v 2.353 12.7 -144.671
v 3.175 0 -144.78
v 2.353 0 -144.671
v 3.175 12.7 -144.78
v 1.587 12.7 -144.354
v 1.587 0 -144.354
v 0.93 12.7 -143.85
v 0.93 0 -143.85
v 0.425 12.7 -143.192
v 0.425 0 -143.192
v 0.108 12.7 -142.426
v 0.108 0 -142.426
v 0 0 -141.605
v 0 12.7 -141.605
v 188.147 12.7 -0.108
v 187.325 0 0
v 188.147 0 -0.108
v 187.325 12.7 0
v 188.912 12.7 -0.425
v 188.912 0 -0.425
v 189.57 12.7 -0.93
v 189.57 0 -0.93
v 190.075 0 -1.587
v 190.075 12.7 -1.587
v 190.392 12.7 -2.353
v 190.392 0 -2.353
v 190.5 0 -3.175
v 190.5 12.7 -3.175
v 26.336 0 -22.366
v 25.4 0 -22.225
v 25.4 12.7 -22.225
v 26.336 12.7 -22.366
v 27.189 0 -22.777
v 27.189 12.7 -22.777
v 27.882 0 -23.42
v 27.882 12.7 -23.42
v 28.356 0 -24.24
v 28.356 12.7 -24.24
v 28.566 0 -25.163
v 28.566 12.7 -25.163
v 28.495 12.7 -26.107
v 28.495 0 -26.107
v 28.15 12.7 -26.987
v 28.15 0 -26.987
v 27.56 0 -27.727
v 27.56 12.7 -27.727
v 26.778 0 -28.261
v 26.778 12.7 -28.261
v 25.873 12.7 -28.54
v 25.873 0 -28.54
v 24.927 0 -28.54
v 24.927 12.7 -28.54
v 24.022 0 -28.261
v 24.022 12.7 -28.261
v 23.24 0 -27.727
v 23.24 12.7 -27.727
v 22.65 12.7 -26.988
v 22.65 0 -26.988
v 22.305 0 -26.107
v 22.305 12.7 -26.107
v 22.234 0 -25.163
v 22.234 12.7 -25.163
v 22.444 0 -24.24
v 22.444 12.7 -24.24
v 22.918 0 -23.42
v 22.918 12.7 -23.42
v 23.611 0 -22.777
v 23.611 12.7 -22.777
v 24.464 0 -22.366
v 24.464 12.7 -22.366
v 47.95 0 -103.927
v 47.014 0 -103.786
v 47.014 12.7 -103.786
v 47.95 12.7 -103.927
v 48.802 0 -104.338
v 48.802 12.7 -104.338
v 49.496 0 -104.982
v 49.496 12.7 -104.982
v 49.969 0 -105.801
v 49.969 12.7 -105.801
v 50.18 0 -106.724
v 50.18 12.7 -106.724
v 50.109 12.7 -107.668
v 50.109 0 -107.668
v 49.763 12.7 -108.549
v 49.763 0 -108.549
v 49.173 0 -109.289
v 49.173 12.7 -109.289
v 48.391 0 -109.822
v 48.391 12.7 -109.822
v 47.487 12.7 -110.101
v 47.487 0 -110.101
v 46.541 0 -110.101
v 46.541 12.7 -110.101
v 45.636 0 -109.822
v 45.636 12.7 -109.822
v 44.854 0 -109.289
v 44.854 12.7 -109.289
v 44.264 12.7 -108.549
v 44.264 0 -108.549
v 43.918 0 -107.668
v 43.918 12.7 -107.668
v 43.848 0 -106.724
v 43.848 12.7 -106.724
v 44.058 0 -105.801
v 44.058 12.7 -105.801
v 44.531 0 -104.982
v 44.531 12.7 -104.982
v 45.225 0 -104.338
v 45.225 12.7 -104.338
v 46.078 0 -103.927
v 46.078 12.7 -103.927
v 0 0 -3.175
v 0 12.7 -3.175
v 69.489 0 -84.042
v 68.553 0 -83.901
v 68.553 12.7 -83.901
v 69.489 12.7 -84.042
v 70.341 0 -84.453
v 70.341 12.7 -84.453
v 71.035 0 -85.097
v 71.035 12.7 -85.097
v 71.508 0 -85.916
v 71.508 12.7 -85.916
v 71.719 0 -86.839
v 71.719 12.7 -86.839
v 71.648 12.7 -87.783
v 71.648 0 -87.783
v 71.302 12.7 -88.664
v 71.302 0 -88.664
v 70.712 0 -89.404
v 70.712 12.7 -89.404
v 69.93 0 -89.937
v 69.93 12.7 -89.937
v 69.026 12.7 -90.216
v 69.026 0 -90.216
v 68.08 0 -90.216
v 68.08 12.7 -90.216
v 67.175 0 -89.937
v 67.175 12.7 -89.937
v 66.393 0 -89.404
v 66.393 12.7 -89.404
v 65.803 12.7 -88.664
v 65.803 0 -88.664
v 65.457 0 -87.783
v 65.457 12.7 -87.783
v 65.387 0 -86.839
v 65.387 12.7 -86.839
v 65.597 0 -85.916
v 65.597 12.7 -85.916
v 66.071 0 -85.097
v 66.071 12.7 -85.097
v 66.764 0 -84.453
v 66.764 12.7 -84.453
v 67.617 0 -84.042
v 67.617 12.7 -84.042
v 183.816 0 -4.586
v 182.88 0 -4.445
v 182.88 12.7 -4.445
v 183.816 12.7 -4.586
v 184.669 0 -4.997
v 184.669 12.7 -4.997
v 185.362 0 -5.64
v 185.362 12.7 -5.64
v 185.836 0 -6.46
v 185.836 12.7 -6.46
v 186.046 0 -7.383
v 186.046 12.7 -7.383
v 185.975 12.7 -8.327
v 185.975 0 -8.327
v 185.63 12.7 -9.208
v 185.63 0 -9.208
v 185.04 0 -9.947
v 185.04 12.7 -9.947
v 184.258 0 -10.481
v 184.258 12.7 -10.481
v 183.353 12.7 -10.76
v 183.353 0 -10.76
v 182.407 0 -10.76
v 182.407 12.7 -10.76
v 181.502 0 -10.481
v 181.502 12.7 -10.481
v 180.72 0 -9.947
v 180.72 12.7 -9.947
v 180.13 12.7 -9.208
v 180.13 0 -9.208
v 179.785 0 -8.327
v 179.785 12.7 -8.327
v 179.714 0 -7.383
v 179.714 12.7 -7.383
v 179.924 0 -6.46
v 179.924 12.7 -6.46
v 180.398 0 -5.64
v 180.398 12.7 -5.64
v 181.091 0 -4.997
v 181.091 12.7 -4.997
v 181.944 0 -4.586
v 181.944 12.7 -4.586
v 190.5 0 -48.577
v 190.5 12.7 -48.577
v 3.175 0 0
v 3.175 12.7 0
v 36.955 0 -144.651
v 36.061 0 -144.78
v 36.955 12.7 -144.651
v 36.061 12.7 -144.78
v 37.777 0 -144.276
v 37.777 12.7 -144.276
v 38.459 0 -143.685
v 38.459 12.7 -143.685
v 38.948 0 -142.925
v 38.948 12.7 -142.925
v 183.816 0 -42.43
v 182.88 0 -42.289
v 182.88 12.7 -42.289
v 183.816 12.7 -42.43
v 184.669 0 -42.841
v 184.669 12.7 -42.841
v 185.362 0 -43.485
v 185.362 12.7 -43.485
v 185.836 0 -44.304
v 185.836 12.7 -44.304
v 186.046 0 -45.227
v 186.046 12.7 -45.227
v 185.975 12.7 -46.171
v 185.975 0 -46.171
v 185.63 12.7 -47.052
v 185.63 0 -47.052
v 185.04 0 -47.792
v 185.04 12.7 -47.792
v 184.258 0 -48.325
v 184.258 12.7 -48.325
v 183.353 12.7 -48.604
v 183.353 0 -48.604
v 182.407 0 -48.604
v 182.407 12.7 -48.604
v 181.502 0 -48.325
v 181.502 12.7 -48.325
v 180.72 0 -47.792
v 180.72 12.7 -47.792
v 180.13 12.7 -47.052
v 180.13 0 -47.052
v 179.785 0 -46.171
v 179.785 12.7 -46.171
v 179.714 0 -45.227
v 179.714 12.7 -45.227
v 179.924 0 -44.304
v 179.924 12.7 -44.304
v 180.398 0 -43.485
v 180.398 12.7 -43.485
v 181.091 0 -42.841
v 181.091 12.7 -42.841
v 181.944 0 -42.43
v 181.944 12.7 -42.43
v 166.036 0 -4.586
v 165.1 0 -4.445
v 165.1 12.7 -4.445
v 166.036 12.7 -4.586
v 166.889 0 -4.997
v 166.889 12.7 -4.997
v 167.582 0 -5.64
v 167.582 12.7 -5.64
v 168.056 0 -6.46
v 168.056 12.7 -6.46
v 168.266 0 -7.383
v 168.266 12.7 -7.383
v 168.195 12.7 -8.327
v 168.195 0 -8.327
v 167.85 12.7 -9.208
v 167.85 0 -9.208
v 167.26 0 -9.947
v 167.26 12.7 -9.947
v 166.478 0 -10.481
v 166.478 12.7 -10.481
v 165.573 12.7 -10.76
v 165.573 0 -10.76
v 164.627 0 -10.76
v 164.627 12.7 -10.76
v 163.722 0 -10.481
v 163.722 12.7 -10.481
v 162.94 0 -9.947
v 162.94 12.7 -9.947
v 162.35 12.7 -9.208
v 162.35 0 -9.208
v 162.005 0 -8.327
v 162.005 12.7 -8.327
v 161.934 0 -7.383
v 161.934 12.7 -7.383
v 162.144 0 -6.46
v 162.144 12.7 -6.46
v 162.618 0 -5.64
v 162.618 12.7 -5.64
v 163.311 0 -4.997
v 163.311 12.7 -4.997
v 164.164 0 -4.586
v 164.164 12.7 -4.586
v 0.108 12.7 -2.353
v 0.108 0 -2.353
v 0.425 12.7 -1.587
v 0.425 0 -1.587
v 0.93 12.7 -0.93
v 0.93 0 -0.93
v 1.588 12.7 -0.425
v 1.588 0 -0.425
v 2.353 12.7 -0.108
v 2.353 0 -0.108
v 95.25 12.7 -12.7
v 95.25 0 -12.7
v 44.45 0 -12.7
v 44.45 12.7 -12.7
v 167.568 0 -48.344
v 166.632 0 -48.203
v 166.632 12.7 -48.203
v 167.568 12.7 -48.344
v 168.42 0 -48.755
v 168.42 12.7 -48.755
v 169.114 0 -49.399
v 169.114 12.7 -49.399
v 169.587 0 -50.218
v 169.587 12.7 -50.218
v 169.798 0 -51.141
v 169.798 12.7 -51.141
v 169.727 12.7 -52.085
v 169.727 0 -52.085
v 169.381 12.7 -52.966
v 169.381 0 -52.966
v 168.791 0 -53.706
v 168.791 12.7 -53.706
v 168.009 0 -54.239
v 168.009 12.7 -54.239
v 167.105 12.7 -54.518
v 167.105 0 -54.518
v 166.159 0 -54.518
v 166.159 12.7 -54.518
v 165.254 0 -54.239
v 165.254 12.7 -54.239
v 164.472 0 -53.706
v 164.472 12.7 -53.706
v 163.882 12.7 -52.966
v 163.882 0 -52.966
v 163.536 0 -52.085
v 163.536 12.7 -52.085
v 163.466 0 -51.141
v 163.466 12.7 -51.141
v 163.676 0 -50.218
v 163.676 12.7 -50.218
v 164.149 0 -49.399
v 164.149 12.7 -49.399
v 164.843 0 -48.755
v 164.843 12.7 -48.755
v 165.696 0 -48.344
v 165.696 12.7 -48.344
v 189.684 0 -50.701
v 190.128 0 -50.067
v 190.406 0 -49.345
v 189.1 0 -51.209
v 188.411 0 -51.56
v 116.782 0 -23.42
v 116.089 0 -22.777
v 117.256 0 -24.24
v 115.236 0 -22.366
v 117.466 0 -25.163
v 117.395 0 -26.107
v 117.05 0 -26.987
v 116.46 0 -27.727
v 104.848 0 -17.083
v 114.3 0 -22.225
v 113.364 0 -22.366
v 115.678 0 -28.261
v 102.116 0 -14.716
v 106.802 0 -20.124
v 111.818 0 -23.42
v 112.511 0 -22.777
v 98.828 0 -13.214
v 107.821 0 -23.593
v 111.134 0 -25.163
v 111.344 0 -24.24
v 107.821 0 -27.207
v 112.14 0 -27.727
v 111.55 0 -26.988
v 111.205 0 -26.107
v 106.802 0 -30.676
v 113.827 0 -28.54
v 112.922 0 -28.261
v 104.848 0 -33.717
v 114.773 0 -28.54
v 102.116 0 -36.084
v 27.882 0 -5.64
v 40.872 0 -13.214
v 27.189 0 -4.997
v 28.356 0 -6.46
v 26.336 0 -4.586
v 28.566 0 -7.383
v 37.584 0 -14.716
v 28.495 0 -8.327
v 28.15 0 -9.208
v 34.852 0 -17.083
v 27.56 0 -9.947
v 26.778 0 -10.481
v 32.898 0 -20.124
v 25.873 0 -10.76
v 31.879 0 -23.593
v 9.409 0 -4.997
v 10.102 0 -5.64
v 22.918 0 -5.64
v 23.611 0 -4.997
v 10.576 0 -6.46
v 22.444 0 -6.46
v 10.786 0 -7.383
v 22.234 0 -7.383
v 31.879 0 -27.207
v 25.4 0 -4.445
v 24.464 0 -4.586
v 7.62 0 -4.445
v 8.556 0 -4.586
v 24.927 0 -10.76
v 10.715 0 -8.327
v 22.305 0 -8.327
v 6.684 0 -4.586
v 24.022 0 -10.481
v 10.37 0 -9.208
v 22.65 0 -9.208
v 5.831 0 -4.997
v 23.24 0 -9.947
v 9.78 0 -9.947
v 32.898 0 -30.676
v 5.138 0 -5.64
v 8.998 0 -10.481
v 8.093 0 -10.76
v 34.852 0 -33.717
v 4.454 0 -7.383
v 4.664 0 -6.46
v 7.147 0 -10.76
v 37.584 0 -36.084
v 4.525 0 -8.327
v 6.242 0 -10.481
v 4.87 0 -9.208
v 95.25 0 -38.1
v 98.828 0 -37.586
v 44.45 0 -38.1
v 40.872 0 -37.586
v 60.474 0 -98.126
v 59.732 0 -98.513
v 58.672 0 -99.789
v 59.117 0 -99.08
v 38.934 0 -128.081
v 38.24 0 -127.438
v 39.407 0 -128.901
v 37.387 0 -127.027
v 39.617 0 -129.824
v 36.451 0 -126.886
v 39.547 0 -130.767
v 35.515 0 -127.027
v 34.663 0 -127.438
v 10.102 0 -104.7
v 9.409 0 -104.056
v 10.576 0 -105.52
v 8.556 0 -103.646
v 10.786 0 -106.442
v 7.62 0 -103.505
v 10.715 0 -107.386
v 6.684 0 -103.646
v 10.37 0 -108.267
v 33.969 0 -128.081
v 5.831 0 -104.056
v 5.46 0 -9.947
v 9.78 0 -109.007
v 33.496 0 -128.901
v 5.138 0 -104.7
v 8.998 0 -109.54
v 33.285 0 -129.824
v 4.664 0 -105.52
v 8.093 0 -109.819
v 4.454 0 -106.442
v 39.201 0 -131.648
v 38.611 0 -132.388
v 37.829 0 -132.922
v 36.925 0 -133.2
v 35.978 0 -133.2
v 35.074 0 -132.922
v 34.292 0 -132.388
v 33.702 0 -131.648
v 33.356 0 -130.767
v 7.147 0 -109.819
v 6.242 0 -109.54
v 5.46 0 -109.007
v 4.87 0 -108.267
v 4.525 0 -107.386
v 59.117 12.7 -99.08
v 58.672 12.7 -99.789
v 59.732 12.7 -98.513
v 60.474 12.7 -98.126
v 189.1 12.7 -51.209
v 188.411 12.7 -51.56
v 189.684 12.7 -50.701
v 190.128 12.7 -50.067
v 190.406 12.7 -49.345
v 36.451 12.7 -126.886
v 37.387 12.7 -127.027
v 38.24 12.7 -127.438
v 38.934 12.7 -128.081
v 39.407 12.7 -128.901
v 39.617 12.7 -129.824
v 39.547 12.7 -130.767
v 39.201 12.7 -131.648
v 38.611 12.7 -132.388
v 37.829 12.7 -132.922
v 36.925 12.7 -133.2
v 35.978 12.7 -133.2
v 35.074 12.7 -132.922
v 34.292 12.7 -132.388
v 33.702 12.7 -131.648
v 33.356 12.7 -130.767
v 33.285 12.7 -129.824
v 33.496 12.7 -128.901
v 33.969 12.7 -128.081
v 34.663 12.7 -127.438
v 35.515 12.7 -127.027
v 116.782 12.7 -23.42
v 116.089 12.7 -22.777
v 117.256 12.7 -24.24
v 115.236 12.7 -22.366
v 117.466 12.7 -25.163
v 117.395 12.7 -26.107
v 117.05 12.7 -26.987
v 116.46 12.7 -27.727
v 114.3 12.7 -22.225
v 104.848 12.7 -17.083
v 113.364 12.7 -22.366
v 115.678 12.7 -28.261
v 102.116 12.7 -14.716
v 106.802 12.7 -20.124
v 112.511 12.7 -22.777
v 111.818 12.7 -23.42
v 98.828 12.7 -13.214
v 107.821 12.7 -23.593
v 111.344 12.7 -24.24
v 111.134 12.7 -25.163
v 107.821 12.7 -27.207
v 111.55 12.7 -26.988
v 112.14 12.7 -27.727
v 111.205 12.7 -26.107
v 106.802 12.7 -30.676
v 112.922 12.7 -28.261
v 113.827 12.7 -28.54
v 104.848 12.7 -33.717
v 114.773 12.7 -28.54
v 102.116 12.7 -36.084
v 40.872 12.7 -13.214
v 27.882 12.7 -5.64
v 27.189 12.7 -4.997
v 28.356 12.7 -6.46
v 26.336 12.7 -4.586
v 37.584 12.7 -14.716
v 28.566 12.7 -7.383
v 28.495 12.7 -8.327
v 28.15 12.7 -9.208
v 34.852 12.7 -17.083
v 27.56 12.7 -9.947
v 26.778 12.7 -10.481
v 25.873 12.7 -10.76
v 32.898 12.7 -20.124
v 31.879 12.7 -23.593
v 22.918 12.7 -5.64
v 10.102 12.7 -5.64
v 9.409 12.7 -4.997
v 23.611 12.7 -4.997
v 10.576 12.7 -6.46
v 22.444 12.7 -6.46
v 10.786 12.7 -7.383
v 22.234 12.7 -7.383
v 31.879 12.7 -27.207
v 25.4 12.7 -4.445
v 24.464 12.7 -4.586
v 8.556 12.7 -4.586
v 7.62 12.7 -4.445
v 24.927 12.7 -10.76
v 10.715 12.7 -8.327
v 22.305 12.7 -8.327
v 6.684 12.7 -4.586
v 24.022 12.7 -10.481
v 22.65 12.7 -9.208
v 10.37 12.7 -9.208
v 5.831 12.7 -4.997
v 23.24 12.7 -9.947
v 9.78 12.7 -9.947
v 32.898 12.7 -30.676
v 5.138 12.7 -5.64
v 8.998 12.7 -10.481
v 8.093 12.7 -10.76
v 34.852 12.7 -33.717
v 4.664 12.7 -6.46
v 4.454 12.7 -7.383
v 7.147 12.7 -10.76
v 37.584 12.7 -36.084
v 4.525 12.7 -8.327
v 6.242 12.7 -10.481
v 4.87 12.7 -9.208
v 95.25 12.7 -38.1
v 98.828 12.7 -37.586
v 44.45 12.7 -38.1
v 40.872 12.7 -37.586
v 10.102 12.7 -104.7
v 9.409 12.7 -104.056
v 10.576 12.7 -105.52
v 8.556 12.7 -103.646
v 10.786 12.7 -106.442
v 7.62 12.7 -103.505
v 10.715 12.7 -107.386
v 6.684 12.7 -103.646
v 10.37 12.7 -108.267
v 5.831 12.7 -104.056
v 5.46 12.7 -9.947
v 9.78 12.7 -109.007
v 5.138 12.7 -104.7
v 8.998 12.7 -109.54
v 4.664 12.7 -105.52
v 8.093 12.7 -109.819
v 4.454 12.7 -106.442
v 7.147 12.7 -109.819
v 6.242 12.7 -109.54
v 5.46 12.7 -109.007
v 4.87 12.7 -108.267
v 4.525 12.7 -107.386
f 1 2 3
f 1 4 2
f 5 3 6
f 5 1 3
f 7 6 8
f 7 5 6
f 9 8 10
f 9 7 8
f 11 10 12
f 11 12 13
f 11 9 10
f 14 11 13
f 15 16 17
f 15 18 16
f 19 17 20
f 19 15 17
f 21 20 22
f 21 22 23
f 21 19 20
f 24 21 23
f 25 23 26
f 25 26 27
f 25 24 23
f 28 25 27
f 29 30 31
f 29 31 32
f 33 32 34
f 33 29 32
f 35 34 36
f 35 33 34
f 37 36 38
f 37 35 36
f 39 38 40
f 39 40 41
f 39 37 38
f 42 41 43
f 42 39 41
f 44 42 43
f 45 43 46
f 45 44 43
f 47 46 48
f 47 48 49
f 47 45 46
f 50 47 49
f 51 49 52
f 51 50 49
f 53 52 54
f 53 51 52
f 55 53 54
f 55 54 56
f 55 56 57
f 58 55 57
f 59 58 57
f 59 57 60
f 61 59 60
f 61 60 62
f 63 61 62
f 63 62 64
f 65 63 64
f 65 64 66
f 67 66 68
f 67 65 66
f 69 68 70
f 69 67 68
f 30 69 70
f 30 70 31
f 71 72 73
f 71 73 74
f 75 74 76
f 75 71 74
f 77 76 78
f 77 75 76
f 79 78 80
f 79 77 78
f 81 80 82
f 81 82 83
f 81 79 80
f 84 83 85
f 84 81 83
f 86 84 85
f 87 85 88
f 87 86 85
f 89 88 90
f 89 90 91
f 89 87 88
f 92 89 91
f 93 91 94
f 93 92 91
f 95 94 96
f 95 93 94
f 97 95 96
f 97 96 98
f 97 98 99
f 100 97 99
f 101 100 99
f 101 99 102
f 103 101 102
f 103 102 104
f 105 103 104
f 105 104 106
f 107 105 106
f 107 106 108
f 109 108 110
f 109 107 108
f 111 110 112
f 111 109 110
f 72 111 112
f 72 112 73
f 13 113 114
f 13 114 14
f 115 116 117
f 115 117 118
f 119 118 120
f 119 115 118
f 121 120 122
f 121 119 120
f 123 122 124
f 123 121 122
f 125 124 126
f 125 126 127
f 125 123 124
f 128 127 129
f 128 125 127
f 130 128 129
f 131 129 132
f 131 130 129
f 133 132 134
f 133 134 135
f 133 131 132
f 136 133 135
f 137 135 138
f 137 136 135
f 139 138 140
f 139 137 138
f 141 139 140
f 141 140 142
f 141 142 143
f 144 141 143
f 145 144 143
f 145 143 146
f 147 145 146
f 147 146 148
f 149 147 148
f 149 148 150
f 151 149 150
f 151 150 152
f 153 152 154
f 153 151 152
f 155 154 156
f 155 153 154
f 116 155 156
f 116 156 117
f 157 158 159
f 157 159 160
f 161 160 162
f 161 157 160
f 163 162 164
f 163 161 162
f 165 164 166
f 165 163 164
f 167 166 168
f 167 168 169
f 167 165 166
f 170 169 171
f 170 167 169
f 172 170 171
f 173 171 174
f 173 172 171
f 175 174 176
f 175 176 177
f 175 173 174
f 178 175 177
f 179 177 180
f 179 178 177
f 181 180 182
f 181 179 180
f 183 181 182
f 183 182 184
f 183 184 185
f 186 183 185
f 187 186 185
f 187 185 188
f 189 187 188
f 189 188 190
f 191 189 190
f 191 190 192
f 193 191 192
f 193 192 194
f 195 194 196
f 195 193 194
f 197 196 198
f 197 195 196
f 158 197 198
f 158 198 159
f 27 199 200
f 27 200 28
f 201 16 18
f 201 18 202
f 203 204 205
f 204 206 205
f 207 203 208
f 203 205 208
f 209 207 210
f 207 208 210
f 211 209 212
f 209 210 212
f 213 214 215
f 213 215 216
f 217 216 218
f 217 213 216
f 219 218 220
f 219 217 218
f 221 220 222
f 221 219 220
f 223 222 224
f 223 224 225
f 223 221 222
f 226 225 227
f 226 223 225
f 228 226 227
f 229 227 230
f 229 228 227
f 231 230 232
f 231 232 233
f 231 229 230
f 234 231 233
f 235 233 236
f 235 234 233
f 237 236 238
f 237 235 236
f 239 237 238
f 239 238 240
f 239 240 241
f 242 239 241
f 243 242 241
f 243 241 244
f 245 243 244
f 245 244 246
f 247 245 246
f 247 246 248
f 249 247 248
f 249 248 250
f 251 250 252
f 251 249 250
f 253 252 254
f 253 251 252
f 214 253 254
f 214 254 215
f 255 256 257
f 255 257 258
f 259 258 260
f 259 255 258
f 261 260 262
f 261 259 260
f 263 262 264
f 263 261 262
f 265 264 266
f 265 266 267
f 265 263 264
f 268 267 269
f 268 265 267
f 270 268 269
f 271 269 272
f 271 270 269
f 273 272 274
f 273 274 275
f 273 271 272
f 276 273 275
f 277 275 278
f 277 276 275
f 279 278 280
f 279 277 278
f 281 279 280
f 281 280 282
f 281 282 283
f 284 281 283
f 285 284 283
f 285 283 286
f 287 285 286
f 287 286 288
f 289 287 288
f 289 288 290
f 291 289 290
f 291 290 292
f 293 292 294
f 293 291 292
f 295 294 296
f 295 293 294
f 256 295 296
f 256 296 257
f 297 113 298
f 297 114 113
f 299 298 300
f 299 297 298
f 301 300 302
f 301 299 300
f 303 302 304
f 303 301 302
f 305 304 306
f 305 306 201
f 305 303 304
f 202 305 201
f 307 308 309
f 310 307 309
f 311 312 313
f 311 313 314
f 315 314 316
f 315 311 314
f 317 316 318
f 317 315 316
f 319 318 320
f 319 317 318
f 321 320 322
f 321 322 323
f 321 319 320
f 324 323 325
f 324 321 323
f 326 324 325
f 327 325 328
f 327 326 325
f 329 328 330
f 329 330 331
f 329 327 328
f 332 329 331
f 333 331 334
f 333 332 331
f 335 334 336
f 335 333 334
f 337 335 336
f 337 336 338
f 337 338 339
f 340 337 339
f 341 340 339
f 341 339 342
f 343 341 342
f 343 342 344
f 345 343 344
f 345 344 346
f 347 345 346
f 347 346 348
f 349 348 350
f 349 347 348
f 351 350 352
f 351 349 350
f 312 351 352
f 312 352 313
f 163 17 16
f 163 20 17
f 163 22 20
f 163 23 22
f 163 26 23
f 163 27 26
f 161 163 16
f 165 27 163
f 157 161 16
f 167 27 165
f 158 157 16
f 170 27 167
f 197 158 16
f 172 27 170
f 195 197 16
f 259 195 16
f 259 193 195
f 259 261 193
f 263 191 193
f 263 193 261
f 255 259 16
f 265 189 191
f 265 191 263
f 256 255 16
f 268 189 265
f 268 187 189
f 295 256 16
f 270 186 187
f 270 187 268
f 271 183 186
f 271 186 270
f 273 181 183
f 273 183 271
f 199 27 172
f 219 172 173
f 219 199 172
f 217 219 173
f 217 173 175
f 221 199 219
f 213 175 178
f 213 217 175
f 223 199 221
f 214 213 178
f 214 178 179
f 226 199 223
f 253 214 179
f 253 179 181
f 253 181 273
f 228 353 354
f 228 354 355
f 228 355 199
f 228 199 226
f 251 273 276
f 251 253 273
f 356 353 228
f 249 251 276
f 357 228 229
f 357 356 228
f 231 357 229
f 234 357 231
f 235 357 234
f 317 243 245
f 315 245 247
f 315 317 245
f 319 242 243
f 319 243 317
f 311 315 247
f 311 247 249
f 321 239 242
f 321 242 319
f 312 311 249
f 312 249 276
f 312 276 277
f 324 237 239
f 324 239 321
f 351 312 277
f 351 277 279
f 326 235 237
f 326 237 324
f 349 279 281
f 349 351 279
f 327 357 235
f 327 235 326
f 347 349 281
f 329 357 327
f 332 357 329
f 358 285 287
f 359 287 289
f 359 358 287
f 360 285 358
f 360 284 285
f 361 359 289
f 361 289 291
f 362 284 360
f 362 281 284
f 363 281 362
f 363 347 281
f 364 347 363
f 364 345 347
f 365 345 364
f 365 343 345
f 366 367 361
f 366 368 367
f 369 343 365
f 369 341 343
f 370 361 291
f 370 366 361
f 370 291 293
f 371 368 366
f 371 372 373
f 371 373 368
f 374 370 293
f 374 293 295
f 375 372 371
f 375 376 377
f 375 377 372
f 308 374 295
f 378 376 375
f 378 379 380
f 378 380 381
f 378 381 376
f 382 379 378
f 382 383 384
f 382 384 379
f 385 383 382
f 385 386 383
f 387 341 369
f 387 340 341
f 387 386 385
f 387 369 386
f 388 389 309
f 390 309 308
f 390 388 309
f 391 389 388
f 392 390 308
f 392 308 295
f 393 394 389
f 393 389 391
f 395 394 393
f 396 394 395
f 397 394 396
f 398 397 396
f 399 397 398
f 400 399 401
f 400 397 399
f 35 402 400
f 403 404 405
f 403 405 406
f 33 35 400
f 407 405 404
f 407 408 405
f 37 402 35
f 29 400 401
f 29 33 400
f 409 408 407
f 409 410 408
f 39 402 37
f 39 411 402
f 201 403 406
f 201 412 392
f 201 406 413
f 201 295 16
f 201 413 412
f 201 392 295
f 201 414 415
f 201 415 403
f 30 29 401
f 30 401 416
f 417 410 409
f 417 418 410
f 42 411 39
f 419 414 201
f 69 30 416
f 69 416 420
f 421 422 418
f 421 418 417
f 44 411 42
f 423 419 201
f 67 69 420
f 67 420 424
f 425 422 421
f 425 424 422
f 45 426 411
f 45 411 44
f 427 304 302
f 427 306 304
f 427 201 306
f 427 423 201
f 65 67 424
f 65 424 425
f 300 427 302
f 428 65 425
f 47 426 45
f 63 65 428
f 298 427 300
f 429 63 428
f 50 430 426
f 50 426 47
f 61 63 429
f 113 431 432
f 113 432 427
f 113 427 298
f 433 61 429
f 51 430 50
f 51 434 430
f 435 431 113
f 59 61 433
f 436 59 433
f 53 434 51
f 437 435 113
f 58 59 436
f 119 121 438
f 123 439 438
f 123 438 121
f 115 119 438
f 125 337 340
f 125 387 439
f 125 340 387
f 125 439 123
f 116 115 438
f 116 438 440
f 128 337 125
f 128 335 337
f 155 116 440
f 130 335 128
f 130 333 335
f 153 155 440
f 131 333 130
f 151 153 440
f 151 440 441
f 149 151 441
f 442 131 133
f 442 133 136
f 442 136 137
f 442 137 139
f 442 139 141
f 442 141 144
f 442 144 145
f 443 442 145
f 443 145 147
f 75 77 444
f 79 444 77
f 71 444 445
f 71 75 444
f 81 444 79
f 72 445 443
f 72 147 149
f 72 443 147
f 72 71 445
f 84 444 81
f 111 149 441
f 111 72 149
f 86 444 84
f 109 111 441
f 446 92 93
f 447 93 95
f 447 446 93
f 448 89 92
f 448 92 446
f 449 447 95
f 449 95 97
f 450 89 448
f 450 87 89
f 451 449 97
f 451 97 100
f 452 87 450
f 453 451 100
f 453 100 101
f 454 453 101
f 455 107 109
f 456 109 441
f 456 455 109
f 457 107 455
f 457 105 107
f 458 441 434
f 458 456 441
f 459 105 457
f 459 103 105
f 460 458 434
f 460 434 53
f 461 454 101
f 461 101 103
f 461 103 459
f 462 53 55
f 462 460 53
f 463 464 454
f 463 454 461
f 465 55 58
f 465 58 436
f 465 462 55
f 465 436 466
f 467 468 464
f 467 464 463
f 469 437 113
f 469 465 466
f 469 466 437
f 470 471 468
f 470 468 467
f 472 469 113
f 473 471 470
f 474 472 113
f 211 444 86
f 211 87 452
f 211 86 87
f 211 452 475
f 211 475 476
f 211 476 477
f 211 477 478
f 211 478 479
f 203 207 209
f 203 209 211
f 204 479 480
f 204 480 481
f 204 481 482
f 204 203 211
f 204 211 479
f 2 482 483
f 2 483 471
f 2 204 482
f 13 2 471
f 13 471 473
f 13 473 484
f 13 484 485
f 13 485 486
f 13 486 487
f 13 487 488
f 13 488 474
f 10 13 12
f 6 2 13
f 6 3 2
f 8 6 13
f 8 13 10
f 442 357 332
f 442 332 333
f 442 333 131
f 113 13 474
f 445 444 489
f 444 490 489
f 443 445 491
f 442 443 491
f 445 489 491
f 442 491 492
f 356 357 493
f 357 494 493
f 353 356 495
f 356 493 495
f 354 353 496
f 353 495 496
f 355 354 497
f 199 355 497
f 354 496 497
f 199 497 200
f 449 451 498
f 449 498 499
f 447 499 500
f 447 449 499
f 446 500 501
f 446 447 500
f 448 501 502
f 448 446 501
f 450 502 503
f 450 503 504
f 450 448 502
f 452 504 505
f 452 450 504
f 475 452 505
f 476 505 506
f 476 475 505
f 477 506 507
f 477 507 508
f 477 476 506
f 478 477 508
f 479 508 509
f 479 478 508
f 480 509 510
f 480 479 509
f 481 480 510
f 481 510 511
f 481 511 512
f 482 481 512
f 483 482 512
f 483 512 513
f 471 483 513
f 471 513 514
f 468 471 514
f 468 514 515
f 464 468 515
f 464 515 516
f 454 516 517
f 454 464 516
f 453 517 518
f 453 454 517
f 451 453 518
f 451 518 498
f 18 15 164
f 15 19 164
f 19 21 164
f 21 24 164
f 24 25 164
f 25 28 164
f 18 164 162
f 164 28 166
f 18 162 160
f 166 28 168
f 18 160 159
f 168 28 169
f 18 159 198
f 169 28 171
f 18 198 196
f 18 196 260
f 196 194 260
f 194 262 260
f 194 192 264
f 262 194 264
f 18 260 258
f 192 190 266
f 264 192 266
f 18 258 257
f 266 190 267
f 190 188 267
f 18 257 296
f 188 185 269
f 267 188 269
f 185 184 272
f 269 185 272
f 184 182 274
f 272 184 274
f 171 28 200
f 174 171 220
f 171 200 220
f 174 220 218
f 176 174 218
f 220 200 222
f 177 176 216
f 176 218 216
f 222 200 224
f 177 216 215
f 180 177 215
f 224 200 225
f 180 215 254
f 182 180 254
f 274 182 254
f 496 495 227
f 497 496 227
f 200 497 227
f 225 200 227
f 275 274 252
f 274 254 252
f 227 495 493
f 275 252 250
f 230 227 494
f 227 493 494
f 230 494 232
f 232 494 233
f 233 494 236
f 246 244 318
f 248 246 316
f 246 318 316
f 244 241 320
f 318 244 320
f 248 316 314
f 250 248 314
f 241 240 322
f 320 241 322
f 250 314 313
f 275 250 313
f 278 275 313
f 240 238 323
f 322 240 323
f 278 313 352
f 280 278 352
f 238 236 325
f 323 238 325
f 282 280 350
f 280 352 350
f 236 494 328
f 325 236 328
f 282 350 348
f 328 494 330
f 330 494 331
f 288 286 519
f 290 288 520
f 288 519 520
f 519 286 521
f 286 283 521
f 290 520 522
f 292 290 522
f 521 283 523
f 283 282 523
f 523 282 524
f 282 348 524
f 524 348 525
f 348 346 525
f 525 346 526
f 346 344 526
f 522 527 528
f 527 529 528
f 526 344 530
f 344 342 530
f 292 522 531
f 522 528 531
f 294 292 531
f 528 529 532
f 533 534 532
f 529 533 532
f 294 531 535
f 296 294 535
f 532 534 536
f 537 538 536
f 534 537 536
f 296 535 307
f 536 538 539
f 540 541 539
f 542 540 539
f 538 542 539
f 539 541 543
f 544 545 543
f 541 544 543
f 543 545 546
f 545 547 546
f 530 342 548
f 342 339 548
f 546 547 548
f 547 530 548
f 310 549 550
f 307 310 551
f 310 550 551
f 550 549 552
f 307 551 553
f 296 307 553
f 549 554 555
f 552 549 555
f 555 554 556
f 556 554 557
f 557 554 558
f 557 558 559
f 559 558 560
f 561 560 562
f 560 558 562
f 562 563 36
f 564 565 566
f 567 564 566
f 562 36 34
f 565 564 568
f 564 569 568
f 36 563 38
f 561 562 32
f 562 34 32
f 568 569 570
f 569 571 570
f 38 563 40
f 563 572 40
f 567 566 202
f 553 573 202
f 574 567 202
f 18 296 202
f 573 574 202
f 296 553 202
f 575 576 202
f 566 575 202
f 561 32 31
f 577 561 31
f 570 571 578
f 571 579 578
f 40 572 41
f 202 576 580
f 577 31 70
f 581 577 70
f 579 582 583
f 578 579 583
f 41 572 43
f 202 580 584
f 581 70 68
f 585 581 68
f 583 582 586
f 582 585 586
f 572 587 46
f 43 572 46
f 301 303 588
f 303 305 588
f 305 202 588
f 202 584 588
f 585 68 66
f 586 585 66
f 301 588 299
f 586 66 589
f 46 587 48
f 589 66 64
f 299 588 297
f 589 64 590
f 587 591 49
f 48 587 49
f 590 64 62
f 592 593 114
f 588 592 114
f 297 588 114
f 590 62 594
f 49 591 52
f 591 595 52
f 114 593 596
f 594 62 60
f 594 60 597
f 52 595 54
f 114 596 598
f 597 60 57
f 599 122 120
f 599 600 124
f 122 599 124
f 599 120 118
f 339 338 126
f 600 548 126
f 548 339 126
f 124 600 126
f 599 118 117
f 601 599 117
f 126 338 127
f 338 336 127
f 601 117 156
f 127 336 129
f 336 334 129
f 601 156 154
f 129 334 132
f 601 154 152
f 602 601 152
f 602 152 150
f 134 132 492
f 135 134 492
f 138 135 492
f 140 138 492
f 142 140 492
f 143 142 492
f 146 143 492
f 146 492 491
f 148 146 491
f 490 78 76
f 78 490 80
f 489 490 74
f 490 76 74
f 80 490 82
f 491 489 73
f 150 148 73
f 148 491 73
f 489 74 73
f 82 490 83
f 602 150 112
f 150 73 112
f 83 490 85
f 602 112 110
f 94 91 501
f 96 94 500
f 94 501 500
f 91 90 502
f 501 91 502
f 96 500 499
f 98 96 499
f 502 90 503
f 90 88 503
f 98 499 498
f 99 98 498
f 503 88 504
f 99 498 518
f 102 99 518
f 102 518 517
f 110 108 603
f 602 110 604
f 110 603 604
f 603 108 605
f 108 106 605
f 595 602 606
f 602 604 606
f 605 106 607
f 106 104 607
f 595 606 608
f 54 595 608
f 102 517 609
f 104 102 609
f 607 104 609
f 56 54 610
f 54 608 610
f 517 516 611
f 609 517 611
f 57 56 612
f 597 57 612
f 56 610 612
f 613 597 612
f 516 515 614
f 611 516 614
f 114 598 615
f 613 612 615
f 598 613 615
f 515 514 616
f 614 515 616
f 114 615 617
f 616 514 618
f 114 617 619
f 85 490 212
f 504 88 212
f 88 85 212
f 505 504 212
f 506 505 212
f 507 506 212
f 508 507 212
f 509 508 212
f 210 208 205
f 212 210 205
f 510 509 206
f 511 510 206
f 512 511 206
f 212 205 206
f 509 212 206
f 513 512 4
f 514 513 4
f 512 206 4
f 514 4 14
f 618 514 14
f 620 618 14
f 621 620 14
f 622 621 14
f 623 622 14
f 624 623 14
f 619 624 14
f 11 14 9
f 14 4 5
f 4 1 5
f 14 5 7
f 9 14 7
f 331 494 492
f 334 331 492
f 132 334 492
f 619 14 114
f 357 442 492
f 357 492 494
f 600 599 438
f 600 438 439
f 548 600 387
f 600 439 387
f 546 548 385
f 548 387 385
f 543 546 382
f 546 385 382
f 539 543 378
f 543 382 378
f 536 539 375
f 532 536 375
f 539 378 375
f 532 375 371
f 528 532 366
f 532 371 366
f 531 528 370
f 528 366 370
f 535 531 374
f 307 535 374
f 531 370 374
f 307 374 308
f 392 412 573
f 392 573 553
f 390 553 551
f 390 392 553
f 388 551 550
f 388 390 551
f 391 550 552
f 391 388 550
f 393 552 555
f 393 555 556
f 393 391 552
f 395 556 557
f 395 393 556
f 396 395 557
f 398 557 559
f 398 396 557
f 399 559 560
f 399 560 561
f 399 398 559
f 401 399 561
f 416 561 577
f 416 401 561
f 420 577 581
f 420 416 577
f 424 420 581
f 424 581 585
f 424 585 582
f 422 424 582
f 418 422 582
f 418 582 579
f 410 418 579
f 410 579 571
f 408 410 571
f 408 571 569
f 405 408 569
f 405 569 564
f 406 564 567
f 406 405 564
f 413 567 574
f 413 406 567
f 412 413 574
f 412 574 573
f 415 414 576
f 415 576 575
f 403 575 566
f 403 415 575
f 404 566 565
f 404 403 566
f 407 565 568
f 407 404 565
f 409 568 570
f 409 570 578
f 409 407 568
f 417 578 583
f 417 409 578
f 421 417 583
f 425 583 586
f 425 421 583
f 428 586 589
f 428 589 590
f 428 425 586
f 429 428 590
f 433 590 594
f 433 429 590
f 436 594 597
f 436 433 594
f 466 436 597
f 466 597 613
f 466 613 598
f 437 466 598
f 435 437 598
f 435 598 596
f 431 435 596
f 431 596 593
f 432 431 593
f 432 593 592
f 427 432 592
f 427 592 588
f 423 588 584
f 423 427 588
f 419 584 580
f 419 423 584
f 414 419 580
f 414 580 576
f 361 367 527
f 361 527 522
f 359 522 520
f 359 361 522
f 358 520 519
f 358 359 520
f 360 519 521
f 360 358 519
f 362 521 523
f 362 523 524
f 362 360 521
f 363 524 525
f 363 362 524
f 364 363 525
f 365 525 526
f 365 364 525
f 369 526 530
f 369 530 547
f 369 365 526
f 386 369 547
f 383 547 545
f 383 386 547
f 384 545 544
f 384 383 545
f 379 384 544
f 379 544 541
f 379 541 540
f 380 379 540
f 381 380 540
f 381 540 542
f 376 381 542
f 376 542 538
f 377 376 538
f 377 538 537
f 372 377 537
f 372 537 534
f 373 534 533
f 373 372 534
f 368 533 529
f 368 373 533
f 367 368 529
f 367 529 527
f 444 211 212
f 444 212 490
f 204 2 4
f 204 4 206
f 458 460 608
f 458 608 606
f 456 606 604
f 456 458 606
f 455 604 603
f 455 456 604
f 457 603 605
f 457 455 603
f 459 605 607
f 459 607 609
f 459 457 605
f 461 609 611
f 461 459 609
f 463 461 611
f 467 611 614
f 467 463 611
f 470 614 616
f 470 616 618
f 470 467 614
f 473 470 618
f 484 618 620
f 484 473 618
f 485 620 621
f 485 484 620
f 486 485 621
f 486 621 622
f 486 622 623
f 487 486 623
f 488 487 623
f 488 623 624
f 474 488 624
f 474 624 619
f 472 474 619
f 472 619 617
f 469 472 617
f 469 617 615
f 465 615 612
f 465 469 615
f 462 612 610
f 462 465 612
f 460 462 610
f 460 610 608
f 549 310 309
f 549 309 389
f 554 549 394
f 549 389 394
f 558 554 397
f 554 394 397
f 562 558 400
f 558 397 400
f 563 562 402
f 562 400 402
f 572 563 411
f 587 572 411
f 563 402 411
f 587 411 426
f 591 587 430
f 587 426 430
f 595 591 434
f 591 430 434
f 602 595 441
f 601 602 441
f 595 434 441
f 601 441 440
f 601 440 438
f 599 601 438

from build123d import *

# Parameters (mm, degrees)
BASE_R              = 3.175
BOSS_EXTRUDE1_DEPTH = 12.7
ROUTER_FILLET_R     = 3.175


with BuildPart() as part:
    # base → Boss-Extrude1 (new body)
    with BuildSketch(Plane(origin=(0, 0, 0), x_dir=(1, 0, 0), z_dir=(0, 1, 0))):
        Polygon((0, 144.779530825), (38.1, 144.779530825), (59.224940876, 98.580214023), (190.5, 50.8), (190.5, 0), (0, 0), align=None)
        with Locations(Location((166.631807432, 51.378277014, 0), (0, 0, 270))):
            Circle(BASE_R, mode=Mode.SUBTRACT)
        with Locations(Location((36.451337699, 130.060960493, 0), (0, 0, 270))):
            Circle(BASE_R, mode=Mode.SUBTRACT)
        with Locations(Location((182.88, 45.464418559, 0), (0, 0, 270))):
            Circle(BASE_R, mode=Mode.SUBTRACT)
        with Locations(Location((68.552843668, 87.076100432, 0), (0, 0, 270))):
            Circle(BASE_R, mode=Mode.SUBTRACT)
        with Locations(Location((47.013808137, 106.961302092, 0), (0, 0, 270))):
            Circle(BASE_R, mode=Mode.SUBTRACT)
        with Locations(Location((182.88, 7.62, 0), (0, 0, 270))):
            Circle(BASE_R, mode=Mode.SUBTRACT)
        with Locations(Location((7.62, 7.62, 0), (0, 0, 270))):
            Circle(BASE_R, mode=Mode.SUBTRACT)
        with Locations(Location((7.62, 106.679530825, 0), (0, 0, 270))):
            Circle(BASE_R, mode=Mode.SUBTRACT)
        with Locations(Location((25.4, 7.62, 0), (0, 0, 270))):
            Circle(BASE_R, mode=Mode.SUBTRACT)
        with Locations(Location((165.1, 7.62, 0), (0, 0, 270))):
            Circle(BASE_R, mode=Mode.SUBTRACT)
        with Locations(Location((25.4, 25.4, 0), (0, 0, 270))):
            Circle(BASE_R, mode=Mode.SUBTRACT)
        with Locations(Location((114.3, 25.4, 0), (0, 0, 270))):
            Circle(BASE_R, mode=Mode.SUBTRACT)
        with BuildLine():
            Line((95.25, 12.7), (44.45, 12.7))
            ThreePointArc((44.45, 12.7), (31.75, 25.4), (44.45, 38.1))
            Line((44.45, 38.1), (95.25, 38.1))
            ThreePointArc((95.25, 38.1), (107.95, 25.4), (95.25, 12.7))
        make_face(mode=Mode.SUBTRACT)
    extrude(amount=BOSS_EXTRUDE1_DEPTH)

    # router_fillet
    router_fillet_edges = [part.edges().sort_by_distance(p)[0] for p in [
        (0, 6.35, -144.779530825),
        (38.1, 6.35, -144.779530825),
        (59.224940876, 6.35, -98.580214023),
        (190.5, 6.35, -50.8),
        (190.5, 6.35, 0),
        (0, 6.35, 0),
    ]]
    fillet(router_fillet_edges, radius=ROUTER_FILLET_R)


solid = part.part
